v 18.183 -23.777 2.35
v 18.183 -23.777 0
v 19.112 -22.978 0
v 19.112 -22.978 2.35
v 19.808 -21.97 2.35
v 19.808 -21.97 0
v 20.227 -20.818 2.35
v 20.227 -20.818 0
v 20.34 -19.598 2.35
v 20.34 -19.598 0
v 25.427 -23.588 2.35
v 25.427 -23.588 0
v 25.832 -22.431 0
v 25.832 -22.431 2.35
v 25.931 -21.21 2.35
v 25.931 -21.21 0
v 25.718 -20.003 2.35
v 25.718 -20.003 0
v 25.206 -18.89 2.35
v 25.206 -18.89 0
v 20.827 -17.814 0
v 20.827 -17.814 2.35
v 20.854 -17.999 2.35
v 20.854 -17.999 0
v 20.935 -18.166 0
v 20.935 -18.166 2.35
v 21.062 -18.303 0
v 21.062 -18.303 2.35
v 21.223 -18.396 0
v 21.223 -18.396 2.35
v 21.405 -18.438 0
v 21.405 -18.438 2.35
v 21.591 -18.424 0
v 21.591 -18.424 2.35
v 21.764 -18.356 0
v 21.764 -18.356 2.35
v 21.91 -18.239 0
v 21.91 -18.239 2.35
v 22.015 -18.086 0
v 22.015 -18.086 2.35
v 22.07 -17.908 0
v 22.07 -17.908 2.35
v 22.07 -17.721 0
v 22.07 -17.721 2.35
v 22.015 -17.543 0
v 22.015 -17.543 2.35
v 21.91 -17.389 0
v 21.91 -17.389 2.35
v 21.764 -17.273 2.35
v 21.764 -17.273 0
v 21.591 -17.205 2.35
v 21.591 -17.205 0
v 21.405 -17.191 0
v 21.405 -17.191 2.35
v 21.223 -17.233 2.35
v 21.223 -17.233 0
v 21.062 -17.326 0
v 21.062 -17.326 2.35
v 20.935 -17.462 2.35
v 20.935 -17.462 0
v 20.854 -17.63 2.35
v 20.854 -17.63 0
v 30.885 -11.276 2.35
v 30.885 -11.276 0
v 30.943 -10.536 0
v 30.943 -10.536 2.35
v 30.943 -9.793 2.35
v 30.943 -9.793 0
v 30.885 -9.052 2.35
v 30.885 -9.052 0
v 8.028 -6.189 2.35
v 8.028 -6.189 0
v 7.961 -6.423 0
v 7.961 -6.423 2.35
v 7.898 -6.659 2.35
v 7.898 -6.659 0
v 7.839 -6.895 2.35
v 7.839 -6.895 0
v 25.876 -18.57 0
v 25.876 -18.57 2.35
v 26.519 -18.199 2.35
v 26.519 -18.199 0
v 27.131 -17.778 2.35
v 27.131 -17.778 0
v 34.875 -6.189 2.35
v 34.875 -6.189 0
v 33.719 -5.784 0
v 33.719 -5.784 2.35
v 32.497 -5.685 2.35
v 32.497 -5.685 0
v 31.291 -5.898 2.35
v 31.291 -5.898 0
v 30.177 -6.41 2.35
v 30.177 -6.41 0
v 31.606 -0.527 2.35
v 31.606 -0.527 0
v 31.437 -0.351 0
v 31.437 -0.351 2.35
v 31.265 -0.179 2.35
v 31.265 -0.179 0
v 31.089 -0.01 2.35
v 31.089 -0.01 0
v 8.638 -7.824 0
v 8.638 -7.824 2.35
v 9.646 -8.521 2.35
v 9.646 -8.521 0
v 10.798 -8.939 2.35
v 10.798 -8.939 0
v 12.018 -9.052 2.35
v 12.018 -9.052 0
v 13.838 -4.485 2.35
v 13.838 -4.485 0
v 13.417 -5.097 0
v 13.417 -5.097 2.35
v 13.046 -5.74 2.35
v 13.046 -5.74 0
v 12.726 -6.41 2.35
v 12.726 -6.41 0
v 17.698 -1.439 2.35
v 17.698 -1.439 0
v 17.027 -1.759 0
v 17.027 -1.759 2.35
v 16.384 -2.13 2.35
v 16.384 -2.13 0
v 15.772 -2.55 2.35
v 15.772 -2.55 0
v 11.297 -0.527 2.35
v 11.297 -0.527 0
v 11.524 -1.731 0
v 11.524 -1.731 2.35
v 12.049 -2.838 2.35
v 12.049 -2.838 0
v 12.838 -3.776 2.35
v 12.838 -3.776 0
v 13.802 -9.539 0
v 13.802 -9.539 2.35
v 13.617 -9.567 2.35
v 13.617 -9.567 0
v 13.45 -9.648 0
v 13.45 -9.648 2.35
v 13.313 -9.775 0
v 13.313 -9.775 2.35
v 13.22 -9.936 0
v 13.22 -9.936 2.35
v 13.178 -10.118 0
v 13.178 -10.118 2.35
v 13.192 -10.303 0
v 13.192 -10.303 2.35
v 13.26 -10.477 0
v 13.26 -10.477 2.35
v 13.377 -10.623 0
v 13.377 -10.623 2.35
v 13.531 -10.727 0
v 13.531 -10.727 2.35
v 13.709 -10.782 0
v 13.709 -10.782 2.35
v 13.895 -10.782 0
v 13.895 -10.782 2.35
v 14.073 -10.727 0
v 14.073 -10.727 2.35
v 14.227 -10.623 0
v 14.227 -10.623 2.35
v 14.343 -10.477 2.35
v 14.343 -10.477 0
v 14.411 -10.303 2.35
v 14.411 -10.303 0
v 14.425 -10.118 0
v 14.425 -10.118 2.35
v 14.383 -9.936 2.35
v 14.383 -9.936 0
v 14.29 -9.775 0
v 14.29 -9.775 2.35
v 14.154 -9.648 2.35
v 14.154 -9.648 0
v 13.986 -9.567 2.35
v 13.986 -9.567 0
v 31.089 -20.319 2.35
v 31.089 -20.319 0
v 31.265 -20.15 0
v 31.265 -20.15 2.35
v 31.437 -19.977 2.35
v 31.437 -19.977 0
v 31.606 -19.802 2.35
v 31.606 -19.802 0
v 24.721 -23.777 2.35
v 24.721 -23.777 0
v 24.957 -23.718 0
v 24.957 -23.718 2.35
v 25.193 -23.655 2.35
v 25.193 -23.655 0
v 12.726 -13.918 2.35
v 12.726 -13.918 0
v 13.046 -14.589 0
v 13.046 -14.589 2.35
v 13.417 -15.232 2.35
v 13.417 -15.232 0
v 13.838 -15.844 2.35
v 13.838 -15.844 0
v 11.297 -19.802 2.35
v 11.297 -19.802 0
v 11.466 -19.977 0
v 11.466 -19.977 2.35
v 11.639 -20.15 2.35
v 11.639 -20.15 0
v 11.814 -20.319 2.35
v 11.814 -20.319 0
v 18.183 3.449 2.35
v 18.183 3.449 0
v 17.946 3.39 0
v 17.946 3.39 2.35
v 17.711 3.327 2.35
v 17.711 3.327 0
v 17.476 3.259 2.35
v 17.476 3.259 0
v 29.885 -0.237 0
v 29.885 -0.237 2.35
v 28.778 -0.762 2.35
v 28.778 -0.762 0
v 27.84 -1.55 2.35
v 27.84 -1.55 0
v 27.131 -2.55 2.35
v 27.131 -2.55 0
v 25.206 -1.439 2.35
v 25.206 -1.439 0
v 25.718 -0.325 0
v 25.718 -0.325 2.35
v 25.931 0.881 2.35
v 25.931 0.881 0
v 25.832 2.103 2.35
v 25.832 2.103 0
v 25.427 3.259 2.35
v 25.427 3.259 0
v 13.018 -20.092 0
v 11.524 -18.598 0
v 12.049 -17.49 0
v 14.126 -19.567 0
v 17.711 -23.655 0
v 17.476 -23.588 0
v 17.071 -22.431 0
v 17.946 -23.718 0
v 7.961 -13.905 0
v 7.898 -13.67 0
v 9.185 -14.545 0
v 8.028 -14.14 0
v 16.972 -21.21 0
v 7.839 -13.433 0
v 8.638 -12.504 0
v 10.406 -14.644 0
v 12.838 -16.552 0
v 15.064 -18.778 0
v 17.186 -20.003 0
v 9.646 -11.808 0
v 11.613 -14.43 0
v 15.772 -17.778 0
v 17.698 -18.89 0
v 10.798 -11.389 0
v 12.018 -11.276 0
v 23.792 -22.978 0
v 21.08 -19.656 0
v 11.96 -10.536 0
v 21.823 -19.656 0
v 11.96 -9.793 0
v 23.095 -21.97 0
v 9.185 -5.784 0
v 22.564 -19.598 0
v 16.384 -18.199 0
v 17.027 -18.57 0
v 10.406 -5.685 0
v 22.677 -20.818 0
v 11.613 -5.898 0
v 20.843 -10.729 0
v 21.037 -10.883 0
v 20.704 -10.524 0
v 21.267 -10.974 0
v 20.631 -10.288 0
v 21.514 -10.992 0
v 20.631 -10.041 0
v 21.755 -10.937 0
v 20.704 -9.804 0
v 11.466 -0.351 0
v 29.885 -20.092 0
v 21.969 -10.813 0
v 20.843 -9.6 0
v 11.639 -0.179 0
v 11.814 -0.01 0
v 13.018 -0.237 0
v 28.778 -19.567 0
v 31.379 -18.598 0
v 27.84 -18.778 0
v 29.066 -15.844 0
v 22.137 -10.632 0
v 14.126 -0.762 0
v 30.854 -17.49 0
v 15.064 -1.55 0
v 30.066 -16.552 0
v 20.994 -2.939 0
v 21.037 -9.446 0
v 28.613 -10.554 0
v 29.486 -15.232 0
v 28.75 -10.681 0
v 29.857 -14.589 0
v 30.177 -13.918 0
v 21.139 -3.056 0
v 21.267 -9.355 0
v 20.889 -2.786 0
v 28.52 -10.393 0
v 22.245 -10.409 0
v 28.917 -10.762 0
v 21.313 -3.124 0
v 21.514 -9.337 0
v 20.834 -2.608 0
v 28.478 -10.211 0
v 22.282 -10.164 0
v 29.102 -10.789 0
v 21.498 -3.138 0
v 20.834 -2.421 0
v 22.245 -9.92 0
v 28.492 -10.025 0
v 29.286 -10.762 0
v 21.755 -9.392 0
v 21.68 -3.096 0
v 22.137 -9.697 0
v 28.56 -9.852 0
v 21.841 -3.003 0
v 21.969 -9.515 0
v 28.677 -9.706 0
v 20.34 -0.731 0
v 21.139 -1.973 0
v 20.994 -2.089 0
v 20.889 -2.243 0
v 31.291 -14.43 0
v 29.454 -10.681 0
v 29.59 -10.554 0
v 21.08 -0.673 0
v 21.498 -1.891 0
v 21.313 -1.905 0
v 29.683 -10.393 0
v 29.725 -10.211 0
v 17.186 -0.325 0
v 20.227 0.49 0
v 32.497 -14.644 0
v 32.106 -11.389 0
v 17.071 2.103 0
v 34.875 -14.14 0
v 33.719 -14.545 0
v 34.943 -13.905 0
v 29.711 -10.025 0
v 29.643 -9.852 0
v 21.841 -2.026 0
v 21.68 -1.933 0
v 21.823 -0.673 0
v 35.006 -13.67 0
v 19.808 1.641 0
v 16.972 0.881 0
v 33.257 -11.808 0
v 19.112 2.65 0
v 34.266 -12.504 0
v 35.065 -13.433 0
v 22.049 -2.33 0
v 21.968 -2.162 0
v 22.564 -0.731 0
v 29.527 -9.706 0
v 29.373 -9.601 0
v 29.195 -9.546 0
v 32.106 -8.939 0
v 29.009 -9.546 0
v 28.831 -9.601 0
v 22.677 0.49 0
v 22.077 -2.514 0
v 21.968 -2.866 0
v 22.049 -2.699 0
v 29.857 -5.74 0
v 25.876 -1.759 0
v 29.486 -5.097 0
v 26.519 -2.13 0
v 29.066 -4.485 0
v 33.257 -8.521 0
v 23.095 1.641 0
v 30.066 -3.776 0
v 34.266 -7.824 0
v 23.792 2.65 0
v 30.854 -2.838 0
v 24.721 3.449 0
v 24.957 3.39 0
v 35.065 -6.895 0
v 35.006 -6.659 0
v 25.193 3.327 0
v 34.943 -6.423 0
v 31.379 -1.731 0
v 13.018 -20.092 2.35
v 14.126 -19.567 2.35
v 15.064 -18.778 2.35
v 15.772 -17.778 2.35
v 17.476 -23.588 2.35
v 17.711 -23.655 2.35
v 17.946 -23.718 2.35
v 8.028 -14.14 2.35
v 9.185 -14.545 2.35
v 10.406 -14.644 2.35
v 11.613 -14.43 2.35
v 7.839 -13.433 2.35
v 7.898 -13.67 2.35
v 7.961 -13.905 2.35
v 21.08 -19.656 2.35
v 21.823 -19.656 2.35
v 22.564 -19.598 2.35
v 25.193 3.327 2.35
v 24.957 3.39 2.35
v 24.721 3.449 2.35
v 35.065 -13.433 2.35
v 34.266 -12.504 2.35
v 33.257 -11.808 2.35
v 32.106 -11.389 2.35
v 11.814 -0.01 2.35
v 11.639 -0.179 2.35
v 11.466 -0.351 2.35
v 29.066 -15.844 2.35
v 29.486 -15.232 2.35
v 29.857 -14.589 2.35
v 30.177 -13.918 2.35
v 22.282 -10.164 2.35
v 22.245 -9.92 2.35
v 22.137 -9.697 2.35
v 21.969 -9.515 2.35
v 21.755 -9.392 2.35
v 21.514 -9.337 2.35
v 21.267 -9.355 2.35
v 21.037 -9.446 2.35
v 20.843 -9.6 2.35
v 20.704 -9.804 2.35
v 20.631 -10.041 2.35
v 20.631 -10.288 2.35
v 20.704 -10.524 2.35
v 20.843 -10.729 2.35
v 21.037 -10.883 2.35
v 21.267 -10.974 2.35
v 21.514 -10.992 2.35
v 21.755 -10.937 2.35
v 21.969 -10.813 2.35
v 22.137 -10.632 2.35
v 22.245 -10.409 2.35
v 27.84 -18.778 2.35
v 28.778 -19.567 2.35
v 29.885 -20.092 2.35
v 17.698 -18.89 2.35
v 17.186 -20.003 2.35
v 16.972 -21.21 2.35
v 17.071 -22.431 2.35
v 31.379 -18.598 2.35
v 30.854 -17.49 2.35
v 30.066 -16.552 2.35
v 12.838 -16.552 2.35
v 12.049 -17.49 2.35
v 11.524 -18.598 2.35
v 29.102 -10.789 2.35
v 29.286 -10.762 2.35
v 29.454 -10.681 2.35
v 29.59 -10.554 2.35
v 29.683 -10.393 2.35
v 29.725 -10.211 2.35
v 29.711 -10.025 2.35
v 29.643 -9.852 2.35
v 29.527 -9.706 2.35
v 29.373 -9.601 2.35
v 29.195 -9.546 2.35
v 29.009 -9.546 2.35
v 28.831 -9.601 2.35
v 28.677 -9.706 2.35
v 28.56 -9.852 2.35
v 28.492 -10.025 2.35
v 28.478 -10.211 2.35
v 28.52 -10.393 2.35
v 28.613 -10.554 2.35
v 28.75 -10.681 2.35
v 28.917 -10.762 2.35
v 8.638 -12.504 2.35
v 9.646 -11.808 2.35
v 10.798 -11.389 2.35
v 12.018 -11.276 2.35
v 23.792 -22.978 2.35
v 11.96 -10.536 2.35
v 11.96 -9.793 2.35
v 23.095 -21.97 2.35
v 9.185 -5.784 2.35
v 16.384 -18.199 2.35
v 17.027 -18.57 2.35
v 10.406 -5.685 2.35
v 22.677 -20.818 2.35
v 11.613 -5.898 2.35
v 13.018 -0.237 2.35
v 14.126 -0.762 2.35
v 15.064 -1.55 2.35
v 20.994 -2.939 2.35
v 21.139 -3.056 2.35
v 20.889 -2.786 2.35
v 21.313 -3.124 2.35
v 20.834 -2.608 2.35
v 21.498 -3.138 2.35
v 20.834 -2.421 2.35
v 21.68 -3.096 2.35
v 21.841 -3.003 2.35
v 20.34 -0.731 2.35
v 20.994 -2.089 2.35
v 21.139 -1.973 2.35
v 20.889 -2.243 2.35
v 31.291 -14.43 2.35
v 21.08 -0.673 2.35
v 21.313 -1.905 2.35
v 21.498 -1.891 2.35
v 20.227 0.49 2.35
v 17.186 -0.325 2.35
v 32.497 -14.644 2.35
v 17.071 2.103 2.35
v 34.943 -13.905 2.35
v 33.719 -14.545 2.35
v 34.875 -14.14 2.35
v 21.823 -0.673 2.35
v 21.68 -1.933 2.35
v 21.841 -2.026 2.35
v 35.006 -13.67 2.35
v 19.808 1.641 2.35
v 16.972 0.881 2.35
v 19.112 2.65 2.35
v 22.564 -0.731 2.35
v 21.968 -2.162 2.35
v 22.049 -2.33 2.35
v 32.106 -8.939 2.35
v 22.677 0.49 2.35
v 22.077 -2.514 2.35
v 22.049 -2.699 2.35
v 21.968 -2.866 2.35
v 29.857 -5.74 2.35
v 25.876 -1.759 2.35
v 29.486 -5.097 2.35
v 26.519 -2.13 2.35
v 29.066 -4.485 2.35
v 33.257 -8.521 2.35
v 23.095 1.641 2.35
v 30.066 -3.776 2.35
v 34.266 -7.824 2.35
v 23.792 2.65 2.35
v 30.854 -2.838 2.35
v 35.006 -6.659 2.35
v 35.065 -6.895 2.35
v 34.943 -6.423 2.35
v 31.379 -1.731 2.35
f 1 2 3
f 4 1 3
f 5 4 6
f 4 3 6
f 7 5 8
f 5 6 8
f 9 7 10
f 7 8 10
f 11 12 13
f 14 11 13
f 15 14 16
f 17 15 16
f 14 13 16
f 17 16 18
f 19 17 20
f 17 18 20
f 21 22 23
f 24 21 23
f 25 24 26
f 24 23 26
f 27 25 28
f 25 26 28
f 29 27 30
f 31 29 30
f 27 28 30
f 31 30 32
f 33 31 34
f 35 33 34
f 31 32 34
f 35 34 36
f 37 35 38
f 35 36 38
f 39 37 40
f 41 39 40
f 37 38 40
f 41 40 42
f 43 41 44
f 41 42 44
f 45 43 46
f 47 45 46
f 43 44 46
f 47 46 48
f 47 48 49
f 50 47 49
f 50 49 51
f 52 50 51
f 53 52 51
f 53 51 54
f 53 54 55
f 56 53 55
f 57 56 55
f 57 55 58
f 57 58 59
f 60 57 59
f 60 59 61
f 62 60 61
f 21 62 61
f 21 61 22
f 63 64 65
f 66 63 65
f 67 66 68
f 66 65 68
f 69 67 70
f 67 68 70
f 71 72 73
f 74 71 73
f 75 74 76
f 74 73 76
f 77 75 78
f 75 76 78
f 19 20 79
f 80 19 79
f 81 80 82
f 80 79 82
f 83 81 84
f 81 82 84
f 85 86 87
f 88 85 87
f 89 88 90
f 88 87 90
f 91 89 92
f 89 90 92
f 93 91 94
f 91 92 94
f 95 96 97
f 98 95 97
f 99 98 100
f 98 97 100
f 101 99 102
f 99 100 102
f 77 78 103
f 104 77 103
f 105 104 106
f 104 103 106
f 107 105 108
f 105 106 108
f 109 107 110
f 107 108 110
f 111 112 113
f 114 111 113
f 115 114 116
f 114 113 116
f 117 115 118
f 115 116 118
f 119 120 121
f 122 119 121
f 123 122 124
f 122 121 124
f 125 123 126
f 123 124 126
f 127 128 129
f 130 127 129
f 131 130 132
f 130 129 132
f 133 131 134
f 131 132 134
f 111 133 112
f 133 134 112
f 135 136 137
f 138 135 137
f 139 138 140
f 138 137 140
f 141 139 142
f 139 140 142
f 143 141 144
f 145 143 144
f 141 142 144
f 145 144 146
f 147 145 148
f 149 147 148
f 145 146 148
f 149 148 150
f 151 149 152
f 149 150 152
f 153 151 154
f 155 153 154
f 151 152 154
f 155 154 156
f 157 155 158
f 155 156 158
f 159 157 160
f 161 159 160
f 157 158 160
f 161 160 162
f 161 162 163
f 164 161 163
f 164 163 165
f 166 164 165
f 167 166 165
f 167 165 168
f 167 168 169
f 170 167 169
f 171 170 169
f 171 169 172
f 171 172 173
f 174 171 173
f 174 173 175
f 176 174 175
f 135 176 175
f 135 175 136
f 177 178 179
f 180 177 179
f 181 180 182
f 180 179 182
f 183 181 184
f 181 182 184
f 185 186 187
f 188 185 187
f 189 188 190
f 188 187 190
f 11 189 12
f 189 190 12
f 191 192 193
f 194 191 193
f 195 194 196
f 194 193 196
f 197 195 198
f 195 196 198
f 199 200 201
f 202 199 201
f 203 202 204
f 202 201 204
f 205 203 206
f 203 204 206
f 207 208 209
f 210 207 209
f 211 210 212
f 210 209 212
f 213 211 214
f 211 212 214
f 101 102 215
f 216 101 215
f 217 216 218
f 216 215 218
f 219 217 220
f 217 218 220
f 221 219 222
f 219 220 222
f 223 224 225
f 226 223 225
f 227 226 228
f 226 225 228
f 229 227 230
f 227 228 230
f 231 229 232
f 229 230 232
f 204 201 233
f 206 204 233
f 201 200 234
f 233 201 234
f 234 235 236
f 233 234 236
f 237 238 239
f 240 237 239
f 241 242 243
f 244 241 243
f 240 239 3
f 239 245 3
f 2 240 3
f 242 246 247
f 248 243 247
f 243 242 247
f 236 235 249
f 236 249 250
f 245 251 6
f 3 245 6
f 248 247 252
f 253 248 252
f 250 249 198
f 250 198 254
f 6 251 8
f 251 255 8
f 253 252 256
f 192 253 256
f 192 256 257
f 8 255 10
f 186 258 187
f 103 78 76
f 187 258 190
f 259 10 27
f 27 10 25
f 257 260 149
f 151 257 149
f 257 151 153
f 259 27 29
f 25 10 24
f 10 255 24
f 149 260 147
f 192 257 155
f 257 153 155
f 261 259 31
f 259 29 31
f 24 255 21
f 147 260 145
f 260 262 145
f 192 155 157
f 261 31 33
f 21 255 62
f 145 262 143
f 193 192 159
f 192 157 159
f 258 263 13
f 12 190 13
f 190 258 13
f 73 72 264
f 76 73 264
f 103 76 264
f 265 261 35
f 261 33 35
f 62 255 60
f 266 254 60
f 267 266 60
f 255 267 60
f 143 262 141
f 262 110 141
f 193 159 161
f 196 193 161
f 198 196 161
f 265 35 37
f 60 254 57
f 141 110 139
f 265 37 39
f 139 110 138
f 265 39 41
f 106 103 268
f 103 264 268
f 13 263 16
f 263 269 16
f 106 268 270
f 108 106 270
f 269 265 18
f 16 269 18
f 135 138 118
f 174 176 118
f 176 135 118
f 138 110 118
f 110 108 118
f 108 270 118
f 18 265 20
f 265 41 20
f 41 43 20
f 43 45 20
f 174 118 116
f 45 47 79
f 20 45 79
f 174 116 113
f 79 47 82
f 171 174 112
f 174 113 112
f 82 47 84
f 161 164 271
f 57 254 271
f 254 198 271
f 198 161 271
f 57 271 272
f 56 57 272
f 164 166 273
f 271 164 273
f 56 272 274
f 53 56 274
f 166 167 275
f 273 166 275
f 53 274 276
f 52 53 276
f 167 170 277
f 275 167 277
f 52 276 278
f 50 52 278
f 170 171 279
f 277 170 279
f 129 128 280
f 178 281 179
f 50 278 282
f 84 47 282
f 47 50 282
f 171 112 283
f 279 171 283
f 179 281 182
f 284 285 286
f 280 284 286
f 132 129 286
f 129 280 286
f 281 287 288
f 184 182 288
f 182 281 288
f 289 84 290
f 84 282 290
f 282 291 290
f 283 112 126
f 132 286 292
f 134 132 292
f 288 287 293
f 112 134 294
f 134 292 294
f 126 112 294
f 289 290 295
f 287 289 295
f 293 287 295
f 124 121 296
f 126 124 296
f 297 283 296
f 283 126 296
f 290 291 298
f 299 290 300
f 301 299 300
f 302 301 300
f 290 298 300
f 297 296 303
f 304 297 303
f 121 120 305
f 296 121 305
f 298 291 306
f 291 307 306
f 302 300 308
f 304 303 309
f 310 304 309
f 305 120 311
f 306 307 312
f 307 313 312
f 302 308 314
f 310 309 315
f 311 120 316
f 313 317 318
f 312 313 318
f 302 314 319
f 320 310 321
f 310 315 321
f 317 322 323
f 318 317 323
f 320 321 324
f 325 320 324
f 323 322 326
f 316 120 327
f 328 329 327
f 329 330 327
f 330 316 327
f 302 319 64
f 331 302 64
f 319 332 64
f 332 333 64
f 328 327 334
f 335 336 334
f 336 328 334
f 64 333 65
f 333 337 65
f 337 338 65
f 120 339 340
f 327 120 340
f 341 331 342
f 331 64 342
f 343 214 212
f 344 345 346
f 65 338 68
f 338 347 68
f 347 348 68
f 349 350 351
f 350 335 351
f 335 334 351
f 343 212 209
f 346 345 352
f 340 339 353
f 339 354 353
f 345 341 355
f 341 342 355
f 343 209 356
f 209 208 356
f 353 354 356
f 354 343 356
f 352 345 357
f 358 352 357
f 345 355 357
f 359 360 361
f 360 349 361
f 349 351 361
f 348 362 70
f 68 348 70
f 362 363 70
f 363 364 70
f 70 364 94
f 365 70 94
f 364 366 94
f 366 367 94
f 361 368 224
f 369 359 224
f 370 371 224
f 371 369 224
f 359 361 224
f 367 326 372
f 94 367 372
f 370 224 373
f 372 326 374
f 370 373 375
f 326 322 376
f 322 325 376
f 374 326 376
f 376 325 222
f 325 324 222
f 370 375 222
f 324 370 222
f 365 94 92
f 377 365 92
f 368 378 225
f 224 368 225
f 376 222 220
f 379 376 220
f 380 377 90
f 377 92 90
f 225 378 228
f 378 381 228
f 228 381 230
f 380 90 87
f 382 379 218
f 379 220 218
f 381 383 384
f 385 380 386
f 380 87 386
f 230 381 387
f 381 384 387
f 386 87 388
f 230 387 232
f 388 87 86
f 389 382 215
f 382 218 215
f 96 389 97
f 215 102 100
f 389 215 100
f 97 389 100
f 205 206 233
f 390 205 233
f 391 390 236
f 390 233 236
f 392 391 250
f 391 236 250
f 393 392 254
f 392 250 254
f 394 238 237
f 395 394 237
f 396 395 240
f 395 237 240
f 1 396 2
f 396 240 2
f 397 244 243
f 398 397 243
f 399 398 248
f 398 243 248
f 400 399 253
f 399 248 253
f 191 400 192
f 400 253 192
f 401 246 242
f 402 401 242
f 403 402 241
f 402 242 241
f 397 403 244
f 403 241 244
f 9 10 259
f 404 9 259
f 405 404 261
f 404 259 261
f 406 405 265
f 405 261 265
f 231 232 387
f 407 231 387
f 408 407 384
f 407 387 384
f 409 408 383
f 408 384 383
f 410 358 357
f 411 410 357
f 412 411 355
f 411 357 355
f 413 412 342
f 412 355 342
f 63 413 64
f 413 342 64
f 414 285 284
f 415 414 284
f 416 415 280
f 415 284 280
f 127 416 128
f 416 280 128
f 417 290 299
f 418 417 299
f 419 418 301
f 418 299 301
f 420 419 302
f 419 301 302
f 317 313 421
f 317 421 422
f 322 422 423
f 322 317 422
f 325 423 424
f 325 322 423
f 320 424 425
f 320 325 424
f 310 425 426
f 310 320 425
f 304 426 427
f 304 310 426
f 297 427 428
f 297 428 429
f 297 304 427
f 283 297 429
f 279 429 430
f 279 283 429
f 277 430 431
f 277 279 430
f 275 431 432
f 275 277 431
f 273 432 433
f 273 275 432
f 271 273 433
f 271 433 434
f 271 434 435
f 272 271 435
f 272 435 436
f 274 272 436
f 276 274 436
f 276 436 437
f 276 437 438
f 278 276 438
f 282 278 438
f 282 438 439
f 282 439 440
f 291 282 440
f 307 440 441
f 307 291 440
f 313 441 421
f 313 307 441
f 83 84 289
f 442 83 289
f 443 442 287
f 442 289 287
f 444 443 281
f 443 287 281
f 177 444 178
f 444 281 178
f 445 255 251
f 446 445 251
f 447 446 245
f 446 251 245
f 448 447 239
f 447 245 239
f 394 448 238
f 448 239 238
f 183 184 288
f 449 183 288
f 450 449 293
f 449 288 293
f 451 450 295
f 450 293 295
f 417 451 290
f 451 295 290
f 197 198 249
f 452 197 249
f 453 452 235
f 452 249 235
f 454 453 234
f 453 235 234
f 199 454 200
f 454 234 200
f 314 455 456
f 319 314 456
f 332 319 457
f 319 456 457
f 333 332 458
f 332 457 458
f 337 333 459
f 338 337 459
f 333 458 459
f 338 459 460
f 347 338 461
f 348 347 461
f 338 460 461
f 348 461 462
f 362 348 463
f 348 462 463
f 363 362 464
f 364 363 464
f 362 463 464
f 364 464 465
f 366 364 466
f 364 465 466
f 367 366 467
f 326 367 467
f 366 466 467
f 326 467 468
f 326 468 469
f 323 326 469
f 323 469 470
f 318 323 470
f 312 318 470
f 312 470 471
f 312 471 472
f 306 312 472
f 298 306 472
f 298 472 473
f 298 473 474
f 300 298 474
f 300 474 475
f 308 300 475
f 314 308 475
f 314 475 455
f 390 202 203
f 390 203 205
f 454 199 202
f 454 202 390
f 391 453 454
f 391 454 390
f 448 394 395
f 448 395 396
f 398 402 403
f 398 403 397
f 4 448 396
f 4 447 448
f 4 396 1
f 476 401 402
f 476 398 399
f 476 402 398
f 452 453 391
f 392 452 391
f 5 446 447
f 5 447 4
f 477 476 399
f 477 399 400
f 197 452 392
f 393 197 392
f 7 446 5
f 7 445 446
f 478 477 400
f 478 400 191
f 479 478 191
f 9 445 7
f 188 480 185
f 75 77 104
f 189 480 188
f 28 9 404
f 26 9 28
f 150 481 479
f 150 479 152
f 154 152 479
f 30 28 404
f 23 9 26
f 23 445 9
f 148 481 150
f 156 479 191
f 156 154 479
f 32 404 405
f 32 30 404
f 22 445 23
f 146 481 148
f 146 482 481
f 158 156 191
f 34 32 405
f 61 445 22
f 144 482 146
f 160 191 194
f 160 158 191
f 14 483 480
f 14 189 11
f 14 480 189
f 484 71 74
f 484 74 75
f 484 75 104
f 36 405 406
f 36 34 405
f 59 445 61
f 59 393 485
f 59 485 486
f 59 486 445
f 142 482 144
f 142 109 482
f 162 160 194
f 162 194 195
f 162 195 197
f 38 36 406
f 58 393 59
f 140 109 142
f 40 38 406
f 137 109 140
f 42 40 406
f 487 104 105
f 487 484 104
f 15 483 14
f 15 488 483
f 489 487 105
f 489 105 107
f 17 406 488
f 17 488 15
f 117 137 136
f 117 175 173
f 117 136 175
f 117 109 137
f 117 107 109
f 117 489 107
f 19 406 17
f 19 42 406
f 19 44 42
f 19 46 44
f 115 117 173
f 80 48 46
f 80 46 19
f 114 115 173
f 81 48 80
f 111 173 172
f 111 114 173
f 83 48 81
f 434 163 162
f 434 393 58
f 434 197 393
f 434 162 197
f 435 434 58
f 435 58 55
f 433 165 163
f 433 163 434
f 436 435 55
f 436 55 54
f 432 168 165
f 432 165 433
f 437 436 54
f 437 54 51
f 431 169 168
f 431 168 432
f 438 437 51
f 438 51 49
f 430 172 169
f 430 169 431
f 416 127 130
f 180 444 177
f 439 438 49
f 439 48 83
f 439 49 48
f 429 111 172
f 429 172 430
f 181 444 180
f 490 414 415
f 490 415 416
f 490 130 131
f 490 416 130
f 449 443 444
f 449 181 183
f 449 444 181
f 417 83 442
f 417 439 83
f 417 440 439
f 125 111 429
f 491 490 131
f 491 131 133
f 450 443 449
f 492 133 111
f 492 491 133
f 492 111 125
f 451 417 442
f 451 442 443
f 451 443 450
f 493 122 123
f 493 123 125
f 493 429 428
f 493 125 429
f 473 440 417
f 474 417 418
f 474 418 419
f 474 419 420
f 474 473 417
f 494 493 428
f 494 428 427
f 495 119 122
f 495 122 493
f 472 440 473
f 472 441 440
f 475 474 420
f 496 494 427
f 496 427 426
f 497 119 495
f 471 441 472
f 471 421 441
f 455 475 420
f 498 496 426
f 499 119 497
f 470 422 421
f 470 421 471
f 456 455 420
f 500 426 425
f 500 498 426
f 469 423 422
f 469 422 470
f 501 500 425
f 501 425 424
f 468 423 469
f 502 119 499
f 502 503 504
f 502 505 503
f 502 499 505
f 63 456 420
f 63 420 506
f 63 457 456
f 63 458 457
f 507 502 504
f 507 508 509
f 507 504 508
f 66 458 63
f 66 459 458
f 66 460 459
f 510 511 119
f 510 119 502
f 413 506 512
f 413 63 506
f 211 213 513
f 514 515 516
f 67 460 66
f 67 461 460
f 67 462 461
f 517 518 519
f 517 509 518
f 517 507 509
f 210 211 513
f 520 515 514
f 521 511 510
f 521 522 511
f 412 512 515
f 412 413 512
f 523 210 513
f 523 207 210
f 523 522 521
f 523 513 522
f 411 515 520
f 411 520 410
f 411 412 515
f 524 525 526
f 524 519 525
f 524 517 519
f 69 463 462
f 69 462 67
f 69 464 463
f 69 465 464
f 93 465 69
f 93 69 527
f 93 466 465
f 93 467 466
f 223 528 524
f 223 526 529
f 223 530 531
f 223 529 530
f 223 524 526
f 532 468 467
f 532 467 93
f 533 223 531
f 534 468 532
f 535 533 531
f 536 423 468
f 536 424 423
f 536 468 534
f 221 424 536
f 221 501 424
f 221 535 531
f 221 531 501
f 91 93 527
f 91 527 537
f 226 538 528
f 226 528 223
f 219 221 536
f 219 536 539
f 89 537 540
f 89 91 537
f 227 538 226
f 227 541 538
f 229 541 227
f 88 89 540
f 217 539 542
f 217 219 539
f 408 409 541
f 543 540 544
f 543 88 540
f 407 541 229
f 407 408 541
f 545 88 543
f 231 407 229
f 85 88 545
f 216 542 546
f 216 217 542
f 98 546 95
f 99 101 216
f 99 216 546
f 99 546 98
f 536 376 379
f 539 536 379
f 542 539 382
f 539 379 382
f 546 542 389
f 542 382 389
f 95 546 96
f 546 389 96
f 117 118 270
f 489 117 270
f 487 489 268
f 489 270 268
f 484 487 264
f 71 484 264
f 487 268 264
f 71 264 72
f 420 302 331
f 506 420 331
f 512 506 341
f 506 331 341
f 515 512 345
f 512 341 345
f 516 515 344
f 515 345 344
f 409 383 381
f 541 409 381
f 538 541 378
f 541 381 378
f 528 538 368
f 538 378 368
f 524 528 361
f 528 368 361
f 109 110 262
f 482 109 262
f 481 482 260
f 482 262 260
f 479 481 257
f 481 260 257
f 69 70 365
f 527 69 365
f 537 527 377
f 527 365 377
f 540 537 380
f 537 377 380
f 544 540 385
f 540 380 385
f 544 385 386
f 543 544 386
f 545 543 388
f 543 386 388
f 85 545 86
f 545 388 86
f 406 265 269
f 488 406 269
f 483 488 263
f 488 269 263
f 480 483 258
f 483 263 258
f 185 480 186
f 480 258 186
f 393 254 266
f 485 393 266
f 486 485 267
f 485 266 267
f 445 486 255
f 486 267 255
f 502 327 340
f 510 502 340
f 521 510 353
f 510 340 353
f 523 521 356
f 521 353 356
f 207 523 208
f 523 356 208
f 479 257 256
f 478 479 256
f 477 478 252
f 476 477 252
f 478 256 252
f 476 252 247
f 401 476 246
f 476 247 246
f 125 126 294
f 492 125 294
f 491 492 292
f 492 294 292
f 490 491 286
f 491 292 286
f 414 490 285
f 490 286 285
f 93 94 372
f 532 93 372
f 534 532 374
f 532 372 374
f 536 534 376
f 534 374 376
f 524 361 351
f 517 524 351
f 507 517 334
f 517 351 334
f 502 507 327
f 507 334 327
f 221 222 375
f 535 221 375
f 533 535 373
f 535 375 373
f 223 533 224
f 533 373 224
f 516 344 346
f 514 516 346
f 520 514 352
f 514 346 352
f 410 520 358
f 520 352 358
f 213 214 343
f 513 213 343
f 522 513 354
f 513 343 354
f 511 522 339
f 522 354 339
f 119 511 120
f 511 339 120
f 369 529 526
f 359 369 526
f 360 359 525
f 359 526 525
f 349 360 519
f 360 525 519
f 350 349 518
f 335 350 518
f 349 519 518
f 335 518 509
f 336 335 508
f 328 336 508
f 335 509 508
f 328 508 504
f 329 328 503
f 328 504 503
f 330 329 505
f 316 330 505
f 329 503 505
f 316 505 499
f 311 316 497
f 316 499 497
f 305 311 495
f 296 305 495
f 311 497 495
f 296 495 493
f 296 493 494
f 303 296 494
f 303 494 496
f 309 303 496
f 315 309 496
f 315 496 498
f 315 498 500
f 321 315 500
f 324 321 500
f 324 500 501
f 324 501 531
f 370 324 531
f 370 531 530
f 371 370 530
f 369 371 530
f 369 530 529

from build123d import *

# Parameters (mm, degrees)
SKETCH1_R           = 0.83
BOSS_EXTRUDE1_DEPTH = 2.35
SKETCH2_R           = 0.625
CUT_EXTRUDE1_DEPTH  = 10
CIRPATTERN1_COUNT   = 4


with BuildPart() as part:
    # Sketch1 → Boss-Extrude1 (new body)
    with BuildSketch(Plane.XY):
        with BuildLine():
            ThreePointArc((31.089190509, -0.00961289), (28.777823425, -0.762116774), (27.131493603, -2.550489779))
            ThreePointArc((27.131493603, -2.550489779), (26.201203233, -1.937982234), (25.205610954, -1.438580913))
            ThreePointArc((25.205610954, -1.438580913), (25.931222497, 0.881369039), (25.427226435, 3.259323592))
            ThreePointArc((25.427226435, 3.259323592), (25.075169864, 3.358604023), (24.720639715, 3.448652933))
            ThreePointArc((24.720639715, 3.448652933), (23.095189045, 1.641281911), (22.563612099, -0.730659454))
            ThreePointArc((22.563612099, -0.730659454), (21.451703233, -0.665357545), (20.339794367, -0.730659454))
            ThreePointArc((20.339794367, -0.730659454), (19.80821742, 1.641281911), (18.182766751, 3.448652933))
            ThreePointArc((18.182766751, 3.448652933), (17.828236601, 3.358604023), (17.47618003, 3.259323592))
            ThreePointArc((17.47618003, 3.259323592), (16.972183969, 0.881369039), (17.697795512, -1.438580913))
            ThreePointArc((17.697795512, -1.438580913), (16.702203233, -1.937982234), (15.771912863, -2.550489779))
            ThreePointArc((15.771912863, -2.550489779), (14.12558304, -0.762116774), (11.814215957, -0.00961289))
            ThreePointArc((11.814215957, -0.00961289), (11.552208296, -0.264862608), (11.296958578, -0.526870269))
            ThreePointArc((11.296958578, -0.526870269), (12.049462462, -2.838237352), (13.837835467, -4.484567174))
            ThreePointArc((13.837835467, -4.484567174), (13.225327922, -5.414857545), (12.725926601, -6.410449824))
            ThreePointArc((12.725926601, -6.410449824), (10.40597665, -5.684838281), (8.028022096, -6.188834342))
            ThreePointArc((8.028022096, -6.188834342), (7.928741665, -6.540890913), (7.838692755, -6.895421063))
            ThreePointArc((7.838692755, -6.895421063), (9.646063777, -8.520871732), (12.018005142, -9.052448679))
            ThreePointArc((12.018005142, -9.052448679), (11.952703233, -10.164357545), (12.018005142, -11.276266411))
            ThreePointArc((12.018005142, -11.276266411), (9.646063777, -11.807843357), (7.838692755, -13.433294027))
            ThreePointArc((7.838692755, -13.433294027), (7.928741665, -13.787824176), (8.028022096, -14.139880747))
            ThreePointArc((8.028022096, -14.139880747), (10.40597665, -14.643876808), (12.725926601, -13.918265265))
            ThreePointArc((12.725926601, -13.918265265), (13.225327922, -14.913857545), (13.837835467, -15.844147915))
            ThreePointArc((13.837835467, -15.844147915), (12.049462462, -17.490477737), (11.296958578, -19.80184482))
            ThreePointArc((11.296958578, -19.80184482), (11.552208296, -20.063852481), (11.814215957, -20.3191022))
            ThreePointArc((11.814215957, -20.3191022), (14.12558304, -19.566598315), (15.771912863, -17.77822531))
            ThreePointArc((15.771912863, -17.77822531), (16.702203233, -18.390732855), (17.697795512, -18.890134176))
            ThreePointArc((17.697795512, -18.890134176), (16.972183969, -21.210084128), (17.47618003, -23.588038682))
            ThreePointArc((17.47618003, -23.588038682), (17.828236601, -23.687319113), (18.182766751, -23.777368023))
            ThreePointArc((18.182766751, -23.777368023), (19.80821742, -21.969997001), (20.339794367, -19.598055636))
            ThreePointArc((20.339794367, -19.598055636), (21.451703233, -19.663357545), (22.563612099, -19.598055636))
            ThreePointArc((22.563612099, -19.598055636), (23.095189045, -21.969997001), (24.720639715, -23.777368023))
            ThreePointArc((24.720639715, -23.777368023), (25.075169864, -23.687319113), (25.427226435, -23.588038682))
            ThreePointArc((25.427226435, -23.588038682), (25.931222497, -21.210084128), (25.205610954, -18.890134176))
            ThreePointArc((25.205610954, -18.890134176), (26.201203233, -18.390732855), (27.131493603, -17.77822531))
            ThreePointArc((27.131493603, -17.77822531), (28.777823425, -19.566598315), (31.089190509, -20.3191022))
            ThreePointArc((31.089190509, -20.3191022), (31.351198169, -20.063852481), (31.606447888, -19.80184482))
            ThreePointArc((31.606447888, -19.80184482), (30.853944004, -17.490477737), (29.065570998, -15.844147915))
            ThreePointArc((29.065570998, -15.844147915), (29.678078543, -14.913857545), (30.177479864, -13.918265265))
            ThreePointArc((30.177479864, -13.918265265), (32.497429816, -14.643876808), (34.87538437, -14.139880747))
            ThreePointArc((34.87538437, -14.139880747), (34.974664801, -13.787824176), (35.064713711, -13.433294027))
            ThreePointArc((35.064713711, -13.433294027), (33.257342689, -11.807843357), (30.885401324, -11.276266411))
            ThreePointArc((30.885401324, -11.276266411), (30.950703233, -10.164357545), (30.885401324, -9.052448679))
            ThreePointArc((30.885401324, -9.052448679), (33.257342689, -8.520871732), (35.064713711, -6.895421063))
            ThreePointArc((35.064713711, -6.895421063), (34.974664801, -6.540890913), (34.87538437, -6.188834342))
            ThreePointArc((34.87538437, -6.188834342), (32.497429816, -5.684838281), (30.177479864, -6.410449824))
            ThreePointArc((30.177479864, -6.410449824), (29.678078543, -5.414857545), (29.065570998, -4.484567174))
            ThreePointArc((29.065570998, -4.484567174), (30.853944004, -2.838237352), (31.606447888, -0.526870269))
            ThreePointArc((31.606447888, -0.526870269), (31.351198169, -0.264862608), (31.089190509, -0.00961289))
        make_face()
        with Locations((21.451703233, -10.164357545)):
            Circle(SKETCH1_R, mode=Mode.SUBTRACT)
    extrude(amount=BOSS_EXTRUDE1_DEPTH)

    # Sketch2 → Cut-Extrude1 (cut)
    with BuildSketch(Plane.XY.offset(2.35)):
        with Locations((21.451703233, -2.514357545)):
            Circle(SKETCH2_R)
    cut_extrude1 = extrude(amount=-CUT_EXTRUDE1_DEPTH, mode=Mode.SUBTRACT)

    # CirPattern1: Cut-Extrude1 ×4 about axis
    cirpattern1_axis = Axis((21.451703233, -10.164357545, 17.324311526), (0, 0, -1))
    for i in range(1, CIRPATTERN1_COUNT):
        add(cut_extrude1.rotate(cirpattern1_axis, i * 360 / CIRPATTERN1_COUNT), mode=Mode.SUBTRACT)


solid = part.part
